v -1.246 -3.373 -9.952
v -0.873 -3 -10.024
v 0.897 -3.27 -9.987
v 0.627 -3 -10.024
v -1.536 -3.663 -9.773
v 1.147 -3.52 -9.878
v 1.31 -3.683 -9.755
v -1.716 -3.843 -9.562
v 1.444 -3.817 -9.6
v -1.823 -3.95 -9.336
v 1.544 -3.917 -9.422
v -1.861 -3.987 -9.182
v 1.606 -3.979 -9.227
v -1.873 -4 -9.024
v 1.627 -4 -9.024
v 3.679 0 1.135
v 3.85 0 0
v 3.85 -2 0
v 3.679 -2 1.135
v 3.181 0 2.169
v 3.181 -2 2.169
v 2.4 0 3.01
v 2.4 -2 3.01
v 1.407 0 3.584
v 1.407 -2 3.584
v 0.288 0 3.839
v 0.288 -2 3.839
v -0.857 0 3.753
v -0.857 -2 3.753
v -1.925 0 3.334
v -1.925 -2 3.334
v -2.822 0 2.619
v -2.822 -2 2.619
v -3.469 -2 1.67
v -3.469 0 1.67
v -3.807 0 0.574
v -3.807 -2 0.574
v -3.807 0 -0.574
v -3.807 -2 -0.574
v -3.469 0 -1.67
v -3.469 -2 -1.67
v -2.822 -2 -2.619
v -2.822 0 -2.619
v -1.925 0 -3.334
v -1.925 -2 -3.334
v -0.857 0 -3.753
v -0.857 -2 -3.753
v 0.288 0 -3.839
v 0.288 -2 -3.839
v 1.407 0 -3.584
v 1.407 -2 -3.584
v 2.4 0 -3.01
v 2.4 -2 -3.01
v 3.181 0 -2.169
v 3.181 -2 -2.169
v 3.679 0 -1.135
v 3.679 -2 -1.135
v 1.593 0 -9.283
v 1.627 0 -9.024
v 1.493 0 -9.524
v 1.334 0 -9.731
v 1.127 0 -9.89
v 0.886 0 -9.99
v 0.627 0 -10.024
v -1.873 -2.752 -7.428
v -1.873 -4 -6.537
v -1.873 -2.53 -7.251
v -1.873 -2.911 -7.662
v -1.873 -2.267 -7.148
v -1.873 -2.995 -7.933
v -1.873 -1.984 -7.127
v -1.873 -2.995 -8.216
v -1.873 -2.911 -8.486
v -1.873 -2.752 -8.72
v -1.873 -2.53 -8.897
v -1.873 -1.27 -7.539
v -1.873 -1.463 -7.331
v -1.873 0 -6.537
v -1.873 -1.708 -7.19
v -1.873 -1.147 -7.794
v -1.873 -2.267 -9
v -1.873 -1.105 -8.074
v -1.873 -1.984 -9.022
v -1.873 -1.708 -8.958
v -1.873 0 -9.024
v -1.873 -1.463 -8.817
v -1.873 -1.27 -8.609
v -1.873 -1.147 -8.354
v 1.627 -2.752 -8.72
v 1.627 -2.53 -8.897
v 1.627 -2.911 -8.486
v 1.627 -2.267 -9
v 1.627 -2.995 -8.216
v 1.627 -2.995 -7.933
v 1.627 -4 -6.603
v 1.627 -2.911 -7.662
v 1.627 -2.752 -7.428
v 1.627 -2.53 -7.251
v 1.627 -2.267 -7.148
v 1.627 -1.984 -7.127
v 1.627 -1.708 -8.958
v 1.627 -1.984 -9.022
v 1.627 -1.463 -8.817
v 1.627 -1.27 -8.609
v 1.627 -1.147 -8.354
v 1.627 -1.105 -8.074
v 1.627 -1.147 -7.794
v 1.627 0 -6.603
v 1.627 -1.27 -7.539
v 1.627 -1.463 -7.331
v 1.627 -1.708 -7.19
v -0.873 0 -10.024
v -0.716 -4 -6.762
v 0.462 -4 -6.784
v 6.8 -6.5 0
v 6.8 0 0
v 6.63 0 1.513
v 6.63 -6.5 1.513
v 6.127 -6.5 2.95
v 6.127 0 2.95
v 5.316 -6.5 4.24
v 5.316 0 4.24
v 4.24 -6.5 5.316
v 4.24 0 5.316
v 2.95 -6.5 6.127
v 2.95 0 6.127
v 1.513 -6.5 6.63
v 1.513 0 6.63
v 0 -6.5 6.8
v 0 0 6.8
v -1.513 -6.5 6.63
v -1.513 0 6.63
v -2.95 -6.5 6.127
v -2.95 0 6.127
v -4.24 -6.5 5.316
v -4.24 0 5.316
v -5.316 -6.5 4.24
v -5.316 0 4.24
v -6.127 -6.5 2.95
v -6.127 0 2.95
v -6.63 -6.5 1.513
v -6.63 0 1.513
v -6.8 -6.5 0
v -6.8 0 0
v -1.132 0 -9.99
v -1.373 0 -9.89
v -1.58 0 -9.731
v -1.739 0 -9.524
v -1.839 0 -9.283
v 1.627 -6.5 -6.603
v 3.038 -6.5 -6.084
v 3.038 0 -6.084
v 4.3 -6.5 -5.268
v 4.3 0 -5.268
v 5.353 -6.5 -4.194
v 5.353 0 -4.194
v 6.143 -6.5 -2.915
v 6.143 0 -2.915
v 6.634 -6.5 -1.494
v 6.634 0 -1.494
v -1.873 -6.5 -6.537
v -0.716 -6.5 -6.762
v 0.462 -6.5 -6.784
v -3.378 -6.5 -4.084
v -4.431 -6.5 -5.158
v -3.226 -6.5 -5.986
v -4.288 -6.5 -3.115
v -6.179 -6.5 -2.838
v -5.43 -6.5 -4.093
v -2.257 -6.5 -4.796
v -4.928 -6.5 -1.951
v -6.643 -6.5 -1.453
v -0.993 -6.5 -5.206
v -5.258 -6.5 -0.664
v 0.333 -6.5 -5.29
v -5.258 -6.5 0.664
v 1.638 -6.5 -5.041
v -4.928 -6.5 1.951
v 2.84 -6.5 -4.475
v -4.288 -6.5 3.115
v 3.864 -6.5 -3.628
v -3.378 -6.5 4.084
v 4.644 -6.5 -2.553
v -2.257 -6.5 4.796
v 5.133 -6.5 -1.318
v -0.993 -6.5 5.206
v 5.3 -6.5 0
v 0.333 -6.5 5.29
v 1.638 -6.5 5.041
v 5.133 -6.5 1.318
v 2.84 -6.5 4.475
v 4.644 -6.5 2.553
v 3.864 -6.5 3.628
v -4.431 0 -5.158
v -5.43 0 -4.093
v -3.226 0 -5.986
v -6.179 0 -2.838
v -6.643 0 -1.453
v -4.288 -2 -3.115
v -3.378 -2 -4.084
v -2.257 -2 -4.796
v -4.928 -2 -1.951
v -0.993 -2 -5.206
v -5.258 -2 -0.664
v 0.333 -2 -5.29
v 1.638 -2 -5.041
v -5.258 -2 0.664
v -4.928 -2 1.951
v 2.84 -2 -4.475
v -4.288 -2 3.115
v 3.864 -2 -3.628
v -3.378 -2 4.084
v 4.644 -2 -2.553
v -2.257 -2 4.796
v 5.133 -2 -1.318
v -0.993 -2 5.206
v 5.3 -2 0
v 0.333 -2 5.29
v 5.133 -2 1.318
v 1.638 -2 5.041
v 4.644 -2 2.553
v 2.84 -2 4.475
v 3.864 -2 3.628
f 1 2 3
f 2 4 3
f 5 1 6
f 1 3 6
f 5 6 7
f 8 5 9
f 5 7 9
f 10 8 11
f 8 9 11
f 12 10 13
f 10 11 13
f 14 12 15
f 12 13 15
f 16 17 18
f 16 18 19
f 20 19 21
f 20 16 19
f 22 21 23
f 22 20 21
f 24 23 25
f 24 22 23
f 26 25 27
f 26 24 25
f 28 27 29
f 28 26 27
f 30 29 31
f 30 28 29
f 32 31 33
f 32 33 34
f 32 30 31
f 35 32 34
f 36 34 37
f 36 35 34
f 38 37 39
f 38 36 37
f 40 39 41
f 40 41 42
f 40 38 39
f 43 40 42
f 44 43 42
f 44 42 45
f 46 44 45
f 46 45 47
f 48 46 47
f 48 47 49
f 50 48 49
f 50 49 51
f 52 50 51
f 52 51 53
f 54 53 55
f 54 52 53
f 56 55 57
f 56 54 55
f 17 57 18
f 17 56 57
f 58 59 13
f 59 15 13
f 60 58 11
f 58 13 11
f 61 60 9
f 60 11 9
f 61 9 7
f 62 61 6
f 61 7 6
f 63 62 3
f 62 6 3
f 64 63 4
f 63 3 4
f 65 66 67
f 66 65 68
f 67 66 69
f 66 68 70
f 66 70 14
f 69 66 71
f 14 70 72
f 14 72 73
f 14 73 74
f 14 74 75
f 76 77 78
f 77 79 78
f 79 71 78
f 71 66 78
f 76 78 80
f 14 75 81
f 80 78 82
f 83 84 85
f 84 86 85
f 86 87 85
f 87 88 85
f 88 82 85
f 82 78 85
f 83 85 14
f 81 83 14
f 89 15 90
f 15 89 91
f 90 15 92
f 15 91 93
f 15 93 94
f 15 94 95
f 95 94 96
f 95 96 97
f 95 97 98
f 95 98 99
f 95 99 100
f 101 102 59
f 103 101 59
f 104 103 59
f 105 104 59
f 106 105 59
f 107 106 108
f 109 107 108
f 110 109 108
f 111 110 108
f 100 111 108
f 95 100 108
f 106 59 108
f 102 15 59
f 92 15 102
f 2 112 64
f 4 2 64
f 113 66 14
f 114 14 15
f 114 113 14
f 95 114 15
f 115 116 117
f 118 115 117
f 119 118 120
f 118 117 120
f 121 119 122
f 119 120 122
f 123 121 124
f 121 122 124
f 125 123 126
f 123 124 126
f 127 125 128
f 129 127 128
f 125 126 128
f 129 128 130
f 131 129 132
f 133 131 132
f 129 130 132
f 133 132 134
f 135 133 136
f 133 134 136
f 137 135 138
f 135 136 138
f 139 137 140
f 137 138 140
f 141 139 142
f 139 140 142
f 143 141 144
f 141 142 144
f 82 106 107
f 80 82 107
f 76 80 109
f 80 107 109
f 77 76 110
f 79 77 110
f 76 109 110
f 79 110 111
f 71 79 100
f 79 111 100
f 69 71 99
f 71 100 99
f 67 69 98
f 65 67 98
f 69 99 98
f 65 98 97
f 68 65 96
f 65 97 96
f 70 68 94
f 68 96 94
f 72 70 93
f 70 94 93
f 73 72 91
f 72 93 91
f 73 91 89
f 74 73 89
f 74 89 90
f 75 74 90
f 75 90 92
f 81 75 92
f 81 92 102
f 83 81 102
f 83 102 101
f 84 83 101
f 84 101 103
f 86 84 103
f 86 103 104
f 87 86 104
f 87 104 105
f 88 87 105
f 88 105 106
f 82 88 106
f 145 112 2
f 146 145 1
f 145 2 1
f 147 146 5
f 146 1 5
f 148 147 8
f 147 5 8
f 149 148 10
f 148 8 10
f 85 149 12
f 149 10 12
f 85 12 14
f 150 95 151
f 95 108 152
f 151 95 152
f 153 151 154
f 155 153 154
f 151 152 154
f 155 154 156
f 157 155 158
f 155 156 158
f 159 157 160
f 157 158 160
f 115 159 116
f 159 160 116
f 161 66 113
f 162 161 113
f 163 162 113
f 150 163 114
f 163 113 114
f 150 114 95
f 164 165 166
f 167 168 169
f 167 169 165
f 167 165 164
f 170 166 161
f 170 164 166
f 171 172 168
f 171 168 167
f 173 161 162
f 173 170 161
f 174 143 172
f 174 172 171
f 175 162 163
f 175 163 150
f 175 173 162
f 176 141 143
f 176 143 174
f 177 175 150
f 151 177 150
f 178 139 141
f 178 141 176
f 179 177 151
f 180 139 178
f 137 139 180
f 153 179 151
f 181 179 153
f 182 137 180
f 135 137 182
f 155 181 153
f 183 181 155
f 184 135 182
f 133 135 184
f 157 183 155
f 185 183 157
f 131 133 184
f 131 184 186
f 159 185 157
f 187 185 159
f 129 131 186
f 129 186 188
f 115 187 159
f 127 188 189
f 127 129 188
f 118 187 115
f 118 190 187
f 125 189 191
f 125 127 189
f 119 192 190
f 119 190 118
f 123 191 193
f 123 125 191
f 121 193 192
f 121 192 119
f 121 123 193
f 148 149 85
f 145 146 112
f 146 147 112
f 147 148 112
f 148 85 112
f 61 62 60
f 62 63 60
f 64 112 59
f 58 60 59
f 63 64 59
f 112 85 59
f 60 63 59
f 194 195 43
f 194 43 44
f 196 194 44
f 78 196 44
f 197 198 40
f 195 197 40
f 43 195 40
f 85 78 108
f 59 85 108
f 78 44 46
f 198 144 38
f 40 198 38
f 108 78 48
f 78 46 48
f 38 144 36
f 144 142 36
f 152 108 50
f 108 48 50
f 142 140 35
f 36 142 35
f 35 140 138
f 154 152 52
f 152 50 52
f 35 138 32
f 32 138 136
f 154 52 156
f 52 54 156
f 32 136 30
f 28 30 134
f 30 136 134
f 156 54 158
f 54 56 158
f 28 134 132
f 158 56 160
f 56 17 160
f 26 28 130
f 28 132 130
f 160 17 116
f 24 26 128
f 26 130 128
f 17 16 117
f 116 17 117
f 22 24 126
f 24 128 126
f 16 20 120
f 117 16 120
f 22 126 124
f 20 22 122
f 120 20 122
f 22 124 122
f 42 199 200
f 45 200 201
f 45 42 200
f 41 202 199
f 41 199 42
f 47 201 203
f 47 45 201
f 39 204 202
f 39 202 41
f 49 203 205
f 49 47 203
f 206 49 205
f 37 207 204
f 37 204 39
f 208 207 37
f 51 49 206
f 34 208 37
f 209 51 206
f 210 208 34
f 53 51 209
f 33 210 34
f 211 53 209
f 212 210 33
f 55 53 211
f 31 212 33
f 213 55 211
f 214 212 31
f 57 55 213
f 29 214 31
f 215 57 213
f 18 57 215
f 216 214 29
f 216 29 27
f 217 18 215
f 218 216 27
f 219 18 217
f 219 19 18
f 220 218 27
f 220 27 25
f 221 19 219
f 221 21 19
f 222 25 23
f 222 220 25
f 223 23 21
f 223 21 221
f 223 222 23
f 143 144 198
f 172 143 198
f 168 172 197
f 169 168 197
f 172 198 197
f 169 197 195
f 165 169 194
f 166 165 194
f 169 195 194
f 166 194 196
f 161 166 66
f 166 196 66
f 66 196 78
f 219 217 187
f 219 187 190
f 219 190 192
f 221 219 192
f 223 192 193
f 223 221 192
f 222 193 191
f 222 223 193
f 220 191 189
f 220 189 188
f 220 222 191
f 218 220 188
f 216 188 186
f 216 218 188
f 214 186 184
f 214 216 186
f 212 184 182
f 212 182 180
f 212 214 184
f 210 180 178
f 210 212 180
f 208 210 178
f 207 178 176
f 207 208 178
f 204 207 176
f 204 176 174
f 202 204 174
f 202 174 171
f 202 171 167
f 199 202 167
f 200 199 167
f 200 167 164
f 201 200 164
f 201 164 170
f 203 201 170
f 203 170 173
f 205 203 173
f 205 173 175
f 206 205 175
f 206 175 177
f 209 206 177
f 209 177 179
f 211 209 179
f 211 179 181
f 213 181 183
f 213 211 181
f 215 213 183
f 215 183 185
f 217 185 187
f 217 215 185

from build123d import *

# Parameters (mm, degrees)
F0_R     = 5.3
F0_R_2   = 3.85
F1_DEPTH = 2
F2_DEPTH = 6.5
F3_DEPTH = 4
F4_R     = 0.95
F5_DEPTH = 25.4
F6_R     = 1


with BuildPart() as f1:
    # F0 (on Front) → F1 (new body)
    with BuildSketch(Plane.XZ):
        Circle(F0_R)
        Circle(F0_R_2, mode=Mode.SUBTRACT)
    extrude(amount=F1_DEPTH)

    # F0 (on Front) → F2 (join)
    with BuildSketch(Plane.XZ):
        with BuildLine():
            ThreePointArc((1.6268819186, -6.6025188545), (5.352709387, -4.1938648308), (6.8, 3.00667e-05))
            ThreePointArc((6.8, 3.00667e-05), (-3.00667e-05, 6.8), (-6.8, -3.00667e-05))
            ThreePointArc((-6.8, -3.00667e-05), (-5.4303317767, -4.0928592445), (-1.8731180814, -6.5369280747))
            ThreePointArc((-1.8731180814, -6.5369280747), (-0.1274111438, -6.7988062483), (1.6268819186, -6.6025188545))
        make_face()
        Circle(F0_R, mode=Mode.SUBTRACT)
    extrude(amount=F2_DEPTH)

    # F0 (on Front) → F3 (join)
    with BuildSketch(Plane.XZ):
        with BuildLine():
            Line((1.6268819186, -10.0241614027), (1.6268819186, -6.6025188544))
            ThreePointArc((1.6268819186, -6.6025188545), (-0.1274111438, -6.7988062483), (-1.8731180814, -6.5369280747))
            Line((-1.8731180814, -6.5369280746), (-1.8731180814, -10.0241614027))
            Line((-1.8731180814, -10.0241614027), (1.6268819186, -10.0241614027))
        make_face()
    extrude(amount=F3_DEPTH)

    # F4 (on face) → F5 (cut)
    with BuildSketch(Plane.YZ.offset(1.6268819186)):
        with Locations((-2.055265424, -8.0741614027)):
            Circle(F4_R)
    extrude(amount=-F5_DEPTH, mode=Mode.SUBTRACT)

    # F6
    f6_edges = [f1.edges().sort_by_distance(p)[0] for p in [
        (1.626882, -2, -10.024161),
        (-1.873118, -2, -10.024161),
        (-0.123118, -4, -10.024161),
    ]]
    fillet(f6_edges, radius=F6_R)


solid = f1.part
